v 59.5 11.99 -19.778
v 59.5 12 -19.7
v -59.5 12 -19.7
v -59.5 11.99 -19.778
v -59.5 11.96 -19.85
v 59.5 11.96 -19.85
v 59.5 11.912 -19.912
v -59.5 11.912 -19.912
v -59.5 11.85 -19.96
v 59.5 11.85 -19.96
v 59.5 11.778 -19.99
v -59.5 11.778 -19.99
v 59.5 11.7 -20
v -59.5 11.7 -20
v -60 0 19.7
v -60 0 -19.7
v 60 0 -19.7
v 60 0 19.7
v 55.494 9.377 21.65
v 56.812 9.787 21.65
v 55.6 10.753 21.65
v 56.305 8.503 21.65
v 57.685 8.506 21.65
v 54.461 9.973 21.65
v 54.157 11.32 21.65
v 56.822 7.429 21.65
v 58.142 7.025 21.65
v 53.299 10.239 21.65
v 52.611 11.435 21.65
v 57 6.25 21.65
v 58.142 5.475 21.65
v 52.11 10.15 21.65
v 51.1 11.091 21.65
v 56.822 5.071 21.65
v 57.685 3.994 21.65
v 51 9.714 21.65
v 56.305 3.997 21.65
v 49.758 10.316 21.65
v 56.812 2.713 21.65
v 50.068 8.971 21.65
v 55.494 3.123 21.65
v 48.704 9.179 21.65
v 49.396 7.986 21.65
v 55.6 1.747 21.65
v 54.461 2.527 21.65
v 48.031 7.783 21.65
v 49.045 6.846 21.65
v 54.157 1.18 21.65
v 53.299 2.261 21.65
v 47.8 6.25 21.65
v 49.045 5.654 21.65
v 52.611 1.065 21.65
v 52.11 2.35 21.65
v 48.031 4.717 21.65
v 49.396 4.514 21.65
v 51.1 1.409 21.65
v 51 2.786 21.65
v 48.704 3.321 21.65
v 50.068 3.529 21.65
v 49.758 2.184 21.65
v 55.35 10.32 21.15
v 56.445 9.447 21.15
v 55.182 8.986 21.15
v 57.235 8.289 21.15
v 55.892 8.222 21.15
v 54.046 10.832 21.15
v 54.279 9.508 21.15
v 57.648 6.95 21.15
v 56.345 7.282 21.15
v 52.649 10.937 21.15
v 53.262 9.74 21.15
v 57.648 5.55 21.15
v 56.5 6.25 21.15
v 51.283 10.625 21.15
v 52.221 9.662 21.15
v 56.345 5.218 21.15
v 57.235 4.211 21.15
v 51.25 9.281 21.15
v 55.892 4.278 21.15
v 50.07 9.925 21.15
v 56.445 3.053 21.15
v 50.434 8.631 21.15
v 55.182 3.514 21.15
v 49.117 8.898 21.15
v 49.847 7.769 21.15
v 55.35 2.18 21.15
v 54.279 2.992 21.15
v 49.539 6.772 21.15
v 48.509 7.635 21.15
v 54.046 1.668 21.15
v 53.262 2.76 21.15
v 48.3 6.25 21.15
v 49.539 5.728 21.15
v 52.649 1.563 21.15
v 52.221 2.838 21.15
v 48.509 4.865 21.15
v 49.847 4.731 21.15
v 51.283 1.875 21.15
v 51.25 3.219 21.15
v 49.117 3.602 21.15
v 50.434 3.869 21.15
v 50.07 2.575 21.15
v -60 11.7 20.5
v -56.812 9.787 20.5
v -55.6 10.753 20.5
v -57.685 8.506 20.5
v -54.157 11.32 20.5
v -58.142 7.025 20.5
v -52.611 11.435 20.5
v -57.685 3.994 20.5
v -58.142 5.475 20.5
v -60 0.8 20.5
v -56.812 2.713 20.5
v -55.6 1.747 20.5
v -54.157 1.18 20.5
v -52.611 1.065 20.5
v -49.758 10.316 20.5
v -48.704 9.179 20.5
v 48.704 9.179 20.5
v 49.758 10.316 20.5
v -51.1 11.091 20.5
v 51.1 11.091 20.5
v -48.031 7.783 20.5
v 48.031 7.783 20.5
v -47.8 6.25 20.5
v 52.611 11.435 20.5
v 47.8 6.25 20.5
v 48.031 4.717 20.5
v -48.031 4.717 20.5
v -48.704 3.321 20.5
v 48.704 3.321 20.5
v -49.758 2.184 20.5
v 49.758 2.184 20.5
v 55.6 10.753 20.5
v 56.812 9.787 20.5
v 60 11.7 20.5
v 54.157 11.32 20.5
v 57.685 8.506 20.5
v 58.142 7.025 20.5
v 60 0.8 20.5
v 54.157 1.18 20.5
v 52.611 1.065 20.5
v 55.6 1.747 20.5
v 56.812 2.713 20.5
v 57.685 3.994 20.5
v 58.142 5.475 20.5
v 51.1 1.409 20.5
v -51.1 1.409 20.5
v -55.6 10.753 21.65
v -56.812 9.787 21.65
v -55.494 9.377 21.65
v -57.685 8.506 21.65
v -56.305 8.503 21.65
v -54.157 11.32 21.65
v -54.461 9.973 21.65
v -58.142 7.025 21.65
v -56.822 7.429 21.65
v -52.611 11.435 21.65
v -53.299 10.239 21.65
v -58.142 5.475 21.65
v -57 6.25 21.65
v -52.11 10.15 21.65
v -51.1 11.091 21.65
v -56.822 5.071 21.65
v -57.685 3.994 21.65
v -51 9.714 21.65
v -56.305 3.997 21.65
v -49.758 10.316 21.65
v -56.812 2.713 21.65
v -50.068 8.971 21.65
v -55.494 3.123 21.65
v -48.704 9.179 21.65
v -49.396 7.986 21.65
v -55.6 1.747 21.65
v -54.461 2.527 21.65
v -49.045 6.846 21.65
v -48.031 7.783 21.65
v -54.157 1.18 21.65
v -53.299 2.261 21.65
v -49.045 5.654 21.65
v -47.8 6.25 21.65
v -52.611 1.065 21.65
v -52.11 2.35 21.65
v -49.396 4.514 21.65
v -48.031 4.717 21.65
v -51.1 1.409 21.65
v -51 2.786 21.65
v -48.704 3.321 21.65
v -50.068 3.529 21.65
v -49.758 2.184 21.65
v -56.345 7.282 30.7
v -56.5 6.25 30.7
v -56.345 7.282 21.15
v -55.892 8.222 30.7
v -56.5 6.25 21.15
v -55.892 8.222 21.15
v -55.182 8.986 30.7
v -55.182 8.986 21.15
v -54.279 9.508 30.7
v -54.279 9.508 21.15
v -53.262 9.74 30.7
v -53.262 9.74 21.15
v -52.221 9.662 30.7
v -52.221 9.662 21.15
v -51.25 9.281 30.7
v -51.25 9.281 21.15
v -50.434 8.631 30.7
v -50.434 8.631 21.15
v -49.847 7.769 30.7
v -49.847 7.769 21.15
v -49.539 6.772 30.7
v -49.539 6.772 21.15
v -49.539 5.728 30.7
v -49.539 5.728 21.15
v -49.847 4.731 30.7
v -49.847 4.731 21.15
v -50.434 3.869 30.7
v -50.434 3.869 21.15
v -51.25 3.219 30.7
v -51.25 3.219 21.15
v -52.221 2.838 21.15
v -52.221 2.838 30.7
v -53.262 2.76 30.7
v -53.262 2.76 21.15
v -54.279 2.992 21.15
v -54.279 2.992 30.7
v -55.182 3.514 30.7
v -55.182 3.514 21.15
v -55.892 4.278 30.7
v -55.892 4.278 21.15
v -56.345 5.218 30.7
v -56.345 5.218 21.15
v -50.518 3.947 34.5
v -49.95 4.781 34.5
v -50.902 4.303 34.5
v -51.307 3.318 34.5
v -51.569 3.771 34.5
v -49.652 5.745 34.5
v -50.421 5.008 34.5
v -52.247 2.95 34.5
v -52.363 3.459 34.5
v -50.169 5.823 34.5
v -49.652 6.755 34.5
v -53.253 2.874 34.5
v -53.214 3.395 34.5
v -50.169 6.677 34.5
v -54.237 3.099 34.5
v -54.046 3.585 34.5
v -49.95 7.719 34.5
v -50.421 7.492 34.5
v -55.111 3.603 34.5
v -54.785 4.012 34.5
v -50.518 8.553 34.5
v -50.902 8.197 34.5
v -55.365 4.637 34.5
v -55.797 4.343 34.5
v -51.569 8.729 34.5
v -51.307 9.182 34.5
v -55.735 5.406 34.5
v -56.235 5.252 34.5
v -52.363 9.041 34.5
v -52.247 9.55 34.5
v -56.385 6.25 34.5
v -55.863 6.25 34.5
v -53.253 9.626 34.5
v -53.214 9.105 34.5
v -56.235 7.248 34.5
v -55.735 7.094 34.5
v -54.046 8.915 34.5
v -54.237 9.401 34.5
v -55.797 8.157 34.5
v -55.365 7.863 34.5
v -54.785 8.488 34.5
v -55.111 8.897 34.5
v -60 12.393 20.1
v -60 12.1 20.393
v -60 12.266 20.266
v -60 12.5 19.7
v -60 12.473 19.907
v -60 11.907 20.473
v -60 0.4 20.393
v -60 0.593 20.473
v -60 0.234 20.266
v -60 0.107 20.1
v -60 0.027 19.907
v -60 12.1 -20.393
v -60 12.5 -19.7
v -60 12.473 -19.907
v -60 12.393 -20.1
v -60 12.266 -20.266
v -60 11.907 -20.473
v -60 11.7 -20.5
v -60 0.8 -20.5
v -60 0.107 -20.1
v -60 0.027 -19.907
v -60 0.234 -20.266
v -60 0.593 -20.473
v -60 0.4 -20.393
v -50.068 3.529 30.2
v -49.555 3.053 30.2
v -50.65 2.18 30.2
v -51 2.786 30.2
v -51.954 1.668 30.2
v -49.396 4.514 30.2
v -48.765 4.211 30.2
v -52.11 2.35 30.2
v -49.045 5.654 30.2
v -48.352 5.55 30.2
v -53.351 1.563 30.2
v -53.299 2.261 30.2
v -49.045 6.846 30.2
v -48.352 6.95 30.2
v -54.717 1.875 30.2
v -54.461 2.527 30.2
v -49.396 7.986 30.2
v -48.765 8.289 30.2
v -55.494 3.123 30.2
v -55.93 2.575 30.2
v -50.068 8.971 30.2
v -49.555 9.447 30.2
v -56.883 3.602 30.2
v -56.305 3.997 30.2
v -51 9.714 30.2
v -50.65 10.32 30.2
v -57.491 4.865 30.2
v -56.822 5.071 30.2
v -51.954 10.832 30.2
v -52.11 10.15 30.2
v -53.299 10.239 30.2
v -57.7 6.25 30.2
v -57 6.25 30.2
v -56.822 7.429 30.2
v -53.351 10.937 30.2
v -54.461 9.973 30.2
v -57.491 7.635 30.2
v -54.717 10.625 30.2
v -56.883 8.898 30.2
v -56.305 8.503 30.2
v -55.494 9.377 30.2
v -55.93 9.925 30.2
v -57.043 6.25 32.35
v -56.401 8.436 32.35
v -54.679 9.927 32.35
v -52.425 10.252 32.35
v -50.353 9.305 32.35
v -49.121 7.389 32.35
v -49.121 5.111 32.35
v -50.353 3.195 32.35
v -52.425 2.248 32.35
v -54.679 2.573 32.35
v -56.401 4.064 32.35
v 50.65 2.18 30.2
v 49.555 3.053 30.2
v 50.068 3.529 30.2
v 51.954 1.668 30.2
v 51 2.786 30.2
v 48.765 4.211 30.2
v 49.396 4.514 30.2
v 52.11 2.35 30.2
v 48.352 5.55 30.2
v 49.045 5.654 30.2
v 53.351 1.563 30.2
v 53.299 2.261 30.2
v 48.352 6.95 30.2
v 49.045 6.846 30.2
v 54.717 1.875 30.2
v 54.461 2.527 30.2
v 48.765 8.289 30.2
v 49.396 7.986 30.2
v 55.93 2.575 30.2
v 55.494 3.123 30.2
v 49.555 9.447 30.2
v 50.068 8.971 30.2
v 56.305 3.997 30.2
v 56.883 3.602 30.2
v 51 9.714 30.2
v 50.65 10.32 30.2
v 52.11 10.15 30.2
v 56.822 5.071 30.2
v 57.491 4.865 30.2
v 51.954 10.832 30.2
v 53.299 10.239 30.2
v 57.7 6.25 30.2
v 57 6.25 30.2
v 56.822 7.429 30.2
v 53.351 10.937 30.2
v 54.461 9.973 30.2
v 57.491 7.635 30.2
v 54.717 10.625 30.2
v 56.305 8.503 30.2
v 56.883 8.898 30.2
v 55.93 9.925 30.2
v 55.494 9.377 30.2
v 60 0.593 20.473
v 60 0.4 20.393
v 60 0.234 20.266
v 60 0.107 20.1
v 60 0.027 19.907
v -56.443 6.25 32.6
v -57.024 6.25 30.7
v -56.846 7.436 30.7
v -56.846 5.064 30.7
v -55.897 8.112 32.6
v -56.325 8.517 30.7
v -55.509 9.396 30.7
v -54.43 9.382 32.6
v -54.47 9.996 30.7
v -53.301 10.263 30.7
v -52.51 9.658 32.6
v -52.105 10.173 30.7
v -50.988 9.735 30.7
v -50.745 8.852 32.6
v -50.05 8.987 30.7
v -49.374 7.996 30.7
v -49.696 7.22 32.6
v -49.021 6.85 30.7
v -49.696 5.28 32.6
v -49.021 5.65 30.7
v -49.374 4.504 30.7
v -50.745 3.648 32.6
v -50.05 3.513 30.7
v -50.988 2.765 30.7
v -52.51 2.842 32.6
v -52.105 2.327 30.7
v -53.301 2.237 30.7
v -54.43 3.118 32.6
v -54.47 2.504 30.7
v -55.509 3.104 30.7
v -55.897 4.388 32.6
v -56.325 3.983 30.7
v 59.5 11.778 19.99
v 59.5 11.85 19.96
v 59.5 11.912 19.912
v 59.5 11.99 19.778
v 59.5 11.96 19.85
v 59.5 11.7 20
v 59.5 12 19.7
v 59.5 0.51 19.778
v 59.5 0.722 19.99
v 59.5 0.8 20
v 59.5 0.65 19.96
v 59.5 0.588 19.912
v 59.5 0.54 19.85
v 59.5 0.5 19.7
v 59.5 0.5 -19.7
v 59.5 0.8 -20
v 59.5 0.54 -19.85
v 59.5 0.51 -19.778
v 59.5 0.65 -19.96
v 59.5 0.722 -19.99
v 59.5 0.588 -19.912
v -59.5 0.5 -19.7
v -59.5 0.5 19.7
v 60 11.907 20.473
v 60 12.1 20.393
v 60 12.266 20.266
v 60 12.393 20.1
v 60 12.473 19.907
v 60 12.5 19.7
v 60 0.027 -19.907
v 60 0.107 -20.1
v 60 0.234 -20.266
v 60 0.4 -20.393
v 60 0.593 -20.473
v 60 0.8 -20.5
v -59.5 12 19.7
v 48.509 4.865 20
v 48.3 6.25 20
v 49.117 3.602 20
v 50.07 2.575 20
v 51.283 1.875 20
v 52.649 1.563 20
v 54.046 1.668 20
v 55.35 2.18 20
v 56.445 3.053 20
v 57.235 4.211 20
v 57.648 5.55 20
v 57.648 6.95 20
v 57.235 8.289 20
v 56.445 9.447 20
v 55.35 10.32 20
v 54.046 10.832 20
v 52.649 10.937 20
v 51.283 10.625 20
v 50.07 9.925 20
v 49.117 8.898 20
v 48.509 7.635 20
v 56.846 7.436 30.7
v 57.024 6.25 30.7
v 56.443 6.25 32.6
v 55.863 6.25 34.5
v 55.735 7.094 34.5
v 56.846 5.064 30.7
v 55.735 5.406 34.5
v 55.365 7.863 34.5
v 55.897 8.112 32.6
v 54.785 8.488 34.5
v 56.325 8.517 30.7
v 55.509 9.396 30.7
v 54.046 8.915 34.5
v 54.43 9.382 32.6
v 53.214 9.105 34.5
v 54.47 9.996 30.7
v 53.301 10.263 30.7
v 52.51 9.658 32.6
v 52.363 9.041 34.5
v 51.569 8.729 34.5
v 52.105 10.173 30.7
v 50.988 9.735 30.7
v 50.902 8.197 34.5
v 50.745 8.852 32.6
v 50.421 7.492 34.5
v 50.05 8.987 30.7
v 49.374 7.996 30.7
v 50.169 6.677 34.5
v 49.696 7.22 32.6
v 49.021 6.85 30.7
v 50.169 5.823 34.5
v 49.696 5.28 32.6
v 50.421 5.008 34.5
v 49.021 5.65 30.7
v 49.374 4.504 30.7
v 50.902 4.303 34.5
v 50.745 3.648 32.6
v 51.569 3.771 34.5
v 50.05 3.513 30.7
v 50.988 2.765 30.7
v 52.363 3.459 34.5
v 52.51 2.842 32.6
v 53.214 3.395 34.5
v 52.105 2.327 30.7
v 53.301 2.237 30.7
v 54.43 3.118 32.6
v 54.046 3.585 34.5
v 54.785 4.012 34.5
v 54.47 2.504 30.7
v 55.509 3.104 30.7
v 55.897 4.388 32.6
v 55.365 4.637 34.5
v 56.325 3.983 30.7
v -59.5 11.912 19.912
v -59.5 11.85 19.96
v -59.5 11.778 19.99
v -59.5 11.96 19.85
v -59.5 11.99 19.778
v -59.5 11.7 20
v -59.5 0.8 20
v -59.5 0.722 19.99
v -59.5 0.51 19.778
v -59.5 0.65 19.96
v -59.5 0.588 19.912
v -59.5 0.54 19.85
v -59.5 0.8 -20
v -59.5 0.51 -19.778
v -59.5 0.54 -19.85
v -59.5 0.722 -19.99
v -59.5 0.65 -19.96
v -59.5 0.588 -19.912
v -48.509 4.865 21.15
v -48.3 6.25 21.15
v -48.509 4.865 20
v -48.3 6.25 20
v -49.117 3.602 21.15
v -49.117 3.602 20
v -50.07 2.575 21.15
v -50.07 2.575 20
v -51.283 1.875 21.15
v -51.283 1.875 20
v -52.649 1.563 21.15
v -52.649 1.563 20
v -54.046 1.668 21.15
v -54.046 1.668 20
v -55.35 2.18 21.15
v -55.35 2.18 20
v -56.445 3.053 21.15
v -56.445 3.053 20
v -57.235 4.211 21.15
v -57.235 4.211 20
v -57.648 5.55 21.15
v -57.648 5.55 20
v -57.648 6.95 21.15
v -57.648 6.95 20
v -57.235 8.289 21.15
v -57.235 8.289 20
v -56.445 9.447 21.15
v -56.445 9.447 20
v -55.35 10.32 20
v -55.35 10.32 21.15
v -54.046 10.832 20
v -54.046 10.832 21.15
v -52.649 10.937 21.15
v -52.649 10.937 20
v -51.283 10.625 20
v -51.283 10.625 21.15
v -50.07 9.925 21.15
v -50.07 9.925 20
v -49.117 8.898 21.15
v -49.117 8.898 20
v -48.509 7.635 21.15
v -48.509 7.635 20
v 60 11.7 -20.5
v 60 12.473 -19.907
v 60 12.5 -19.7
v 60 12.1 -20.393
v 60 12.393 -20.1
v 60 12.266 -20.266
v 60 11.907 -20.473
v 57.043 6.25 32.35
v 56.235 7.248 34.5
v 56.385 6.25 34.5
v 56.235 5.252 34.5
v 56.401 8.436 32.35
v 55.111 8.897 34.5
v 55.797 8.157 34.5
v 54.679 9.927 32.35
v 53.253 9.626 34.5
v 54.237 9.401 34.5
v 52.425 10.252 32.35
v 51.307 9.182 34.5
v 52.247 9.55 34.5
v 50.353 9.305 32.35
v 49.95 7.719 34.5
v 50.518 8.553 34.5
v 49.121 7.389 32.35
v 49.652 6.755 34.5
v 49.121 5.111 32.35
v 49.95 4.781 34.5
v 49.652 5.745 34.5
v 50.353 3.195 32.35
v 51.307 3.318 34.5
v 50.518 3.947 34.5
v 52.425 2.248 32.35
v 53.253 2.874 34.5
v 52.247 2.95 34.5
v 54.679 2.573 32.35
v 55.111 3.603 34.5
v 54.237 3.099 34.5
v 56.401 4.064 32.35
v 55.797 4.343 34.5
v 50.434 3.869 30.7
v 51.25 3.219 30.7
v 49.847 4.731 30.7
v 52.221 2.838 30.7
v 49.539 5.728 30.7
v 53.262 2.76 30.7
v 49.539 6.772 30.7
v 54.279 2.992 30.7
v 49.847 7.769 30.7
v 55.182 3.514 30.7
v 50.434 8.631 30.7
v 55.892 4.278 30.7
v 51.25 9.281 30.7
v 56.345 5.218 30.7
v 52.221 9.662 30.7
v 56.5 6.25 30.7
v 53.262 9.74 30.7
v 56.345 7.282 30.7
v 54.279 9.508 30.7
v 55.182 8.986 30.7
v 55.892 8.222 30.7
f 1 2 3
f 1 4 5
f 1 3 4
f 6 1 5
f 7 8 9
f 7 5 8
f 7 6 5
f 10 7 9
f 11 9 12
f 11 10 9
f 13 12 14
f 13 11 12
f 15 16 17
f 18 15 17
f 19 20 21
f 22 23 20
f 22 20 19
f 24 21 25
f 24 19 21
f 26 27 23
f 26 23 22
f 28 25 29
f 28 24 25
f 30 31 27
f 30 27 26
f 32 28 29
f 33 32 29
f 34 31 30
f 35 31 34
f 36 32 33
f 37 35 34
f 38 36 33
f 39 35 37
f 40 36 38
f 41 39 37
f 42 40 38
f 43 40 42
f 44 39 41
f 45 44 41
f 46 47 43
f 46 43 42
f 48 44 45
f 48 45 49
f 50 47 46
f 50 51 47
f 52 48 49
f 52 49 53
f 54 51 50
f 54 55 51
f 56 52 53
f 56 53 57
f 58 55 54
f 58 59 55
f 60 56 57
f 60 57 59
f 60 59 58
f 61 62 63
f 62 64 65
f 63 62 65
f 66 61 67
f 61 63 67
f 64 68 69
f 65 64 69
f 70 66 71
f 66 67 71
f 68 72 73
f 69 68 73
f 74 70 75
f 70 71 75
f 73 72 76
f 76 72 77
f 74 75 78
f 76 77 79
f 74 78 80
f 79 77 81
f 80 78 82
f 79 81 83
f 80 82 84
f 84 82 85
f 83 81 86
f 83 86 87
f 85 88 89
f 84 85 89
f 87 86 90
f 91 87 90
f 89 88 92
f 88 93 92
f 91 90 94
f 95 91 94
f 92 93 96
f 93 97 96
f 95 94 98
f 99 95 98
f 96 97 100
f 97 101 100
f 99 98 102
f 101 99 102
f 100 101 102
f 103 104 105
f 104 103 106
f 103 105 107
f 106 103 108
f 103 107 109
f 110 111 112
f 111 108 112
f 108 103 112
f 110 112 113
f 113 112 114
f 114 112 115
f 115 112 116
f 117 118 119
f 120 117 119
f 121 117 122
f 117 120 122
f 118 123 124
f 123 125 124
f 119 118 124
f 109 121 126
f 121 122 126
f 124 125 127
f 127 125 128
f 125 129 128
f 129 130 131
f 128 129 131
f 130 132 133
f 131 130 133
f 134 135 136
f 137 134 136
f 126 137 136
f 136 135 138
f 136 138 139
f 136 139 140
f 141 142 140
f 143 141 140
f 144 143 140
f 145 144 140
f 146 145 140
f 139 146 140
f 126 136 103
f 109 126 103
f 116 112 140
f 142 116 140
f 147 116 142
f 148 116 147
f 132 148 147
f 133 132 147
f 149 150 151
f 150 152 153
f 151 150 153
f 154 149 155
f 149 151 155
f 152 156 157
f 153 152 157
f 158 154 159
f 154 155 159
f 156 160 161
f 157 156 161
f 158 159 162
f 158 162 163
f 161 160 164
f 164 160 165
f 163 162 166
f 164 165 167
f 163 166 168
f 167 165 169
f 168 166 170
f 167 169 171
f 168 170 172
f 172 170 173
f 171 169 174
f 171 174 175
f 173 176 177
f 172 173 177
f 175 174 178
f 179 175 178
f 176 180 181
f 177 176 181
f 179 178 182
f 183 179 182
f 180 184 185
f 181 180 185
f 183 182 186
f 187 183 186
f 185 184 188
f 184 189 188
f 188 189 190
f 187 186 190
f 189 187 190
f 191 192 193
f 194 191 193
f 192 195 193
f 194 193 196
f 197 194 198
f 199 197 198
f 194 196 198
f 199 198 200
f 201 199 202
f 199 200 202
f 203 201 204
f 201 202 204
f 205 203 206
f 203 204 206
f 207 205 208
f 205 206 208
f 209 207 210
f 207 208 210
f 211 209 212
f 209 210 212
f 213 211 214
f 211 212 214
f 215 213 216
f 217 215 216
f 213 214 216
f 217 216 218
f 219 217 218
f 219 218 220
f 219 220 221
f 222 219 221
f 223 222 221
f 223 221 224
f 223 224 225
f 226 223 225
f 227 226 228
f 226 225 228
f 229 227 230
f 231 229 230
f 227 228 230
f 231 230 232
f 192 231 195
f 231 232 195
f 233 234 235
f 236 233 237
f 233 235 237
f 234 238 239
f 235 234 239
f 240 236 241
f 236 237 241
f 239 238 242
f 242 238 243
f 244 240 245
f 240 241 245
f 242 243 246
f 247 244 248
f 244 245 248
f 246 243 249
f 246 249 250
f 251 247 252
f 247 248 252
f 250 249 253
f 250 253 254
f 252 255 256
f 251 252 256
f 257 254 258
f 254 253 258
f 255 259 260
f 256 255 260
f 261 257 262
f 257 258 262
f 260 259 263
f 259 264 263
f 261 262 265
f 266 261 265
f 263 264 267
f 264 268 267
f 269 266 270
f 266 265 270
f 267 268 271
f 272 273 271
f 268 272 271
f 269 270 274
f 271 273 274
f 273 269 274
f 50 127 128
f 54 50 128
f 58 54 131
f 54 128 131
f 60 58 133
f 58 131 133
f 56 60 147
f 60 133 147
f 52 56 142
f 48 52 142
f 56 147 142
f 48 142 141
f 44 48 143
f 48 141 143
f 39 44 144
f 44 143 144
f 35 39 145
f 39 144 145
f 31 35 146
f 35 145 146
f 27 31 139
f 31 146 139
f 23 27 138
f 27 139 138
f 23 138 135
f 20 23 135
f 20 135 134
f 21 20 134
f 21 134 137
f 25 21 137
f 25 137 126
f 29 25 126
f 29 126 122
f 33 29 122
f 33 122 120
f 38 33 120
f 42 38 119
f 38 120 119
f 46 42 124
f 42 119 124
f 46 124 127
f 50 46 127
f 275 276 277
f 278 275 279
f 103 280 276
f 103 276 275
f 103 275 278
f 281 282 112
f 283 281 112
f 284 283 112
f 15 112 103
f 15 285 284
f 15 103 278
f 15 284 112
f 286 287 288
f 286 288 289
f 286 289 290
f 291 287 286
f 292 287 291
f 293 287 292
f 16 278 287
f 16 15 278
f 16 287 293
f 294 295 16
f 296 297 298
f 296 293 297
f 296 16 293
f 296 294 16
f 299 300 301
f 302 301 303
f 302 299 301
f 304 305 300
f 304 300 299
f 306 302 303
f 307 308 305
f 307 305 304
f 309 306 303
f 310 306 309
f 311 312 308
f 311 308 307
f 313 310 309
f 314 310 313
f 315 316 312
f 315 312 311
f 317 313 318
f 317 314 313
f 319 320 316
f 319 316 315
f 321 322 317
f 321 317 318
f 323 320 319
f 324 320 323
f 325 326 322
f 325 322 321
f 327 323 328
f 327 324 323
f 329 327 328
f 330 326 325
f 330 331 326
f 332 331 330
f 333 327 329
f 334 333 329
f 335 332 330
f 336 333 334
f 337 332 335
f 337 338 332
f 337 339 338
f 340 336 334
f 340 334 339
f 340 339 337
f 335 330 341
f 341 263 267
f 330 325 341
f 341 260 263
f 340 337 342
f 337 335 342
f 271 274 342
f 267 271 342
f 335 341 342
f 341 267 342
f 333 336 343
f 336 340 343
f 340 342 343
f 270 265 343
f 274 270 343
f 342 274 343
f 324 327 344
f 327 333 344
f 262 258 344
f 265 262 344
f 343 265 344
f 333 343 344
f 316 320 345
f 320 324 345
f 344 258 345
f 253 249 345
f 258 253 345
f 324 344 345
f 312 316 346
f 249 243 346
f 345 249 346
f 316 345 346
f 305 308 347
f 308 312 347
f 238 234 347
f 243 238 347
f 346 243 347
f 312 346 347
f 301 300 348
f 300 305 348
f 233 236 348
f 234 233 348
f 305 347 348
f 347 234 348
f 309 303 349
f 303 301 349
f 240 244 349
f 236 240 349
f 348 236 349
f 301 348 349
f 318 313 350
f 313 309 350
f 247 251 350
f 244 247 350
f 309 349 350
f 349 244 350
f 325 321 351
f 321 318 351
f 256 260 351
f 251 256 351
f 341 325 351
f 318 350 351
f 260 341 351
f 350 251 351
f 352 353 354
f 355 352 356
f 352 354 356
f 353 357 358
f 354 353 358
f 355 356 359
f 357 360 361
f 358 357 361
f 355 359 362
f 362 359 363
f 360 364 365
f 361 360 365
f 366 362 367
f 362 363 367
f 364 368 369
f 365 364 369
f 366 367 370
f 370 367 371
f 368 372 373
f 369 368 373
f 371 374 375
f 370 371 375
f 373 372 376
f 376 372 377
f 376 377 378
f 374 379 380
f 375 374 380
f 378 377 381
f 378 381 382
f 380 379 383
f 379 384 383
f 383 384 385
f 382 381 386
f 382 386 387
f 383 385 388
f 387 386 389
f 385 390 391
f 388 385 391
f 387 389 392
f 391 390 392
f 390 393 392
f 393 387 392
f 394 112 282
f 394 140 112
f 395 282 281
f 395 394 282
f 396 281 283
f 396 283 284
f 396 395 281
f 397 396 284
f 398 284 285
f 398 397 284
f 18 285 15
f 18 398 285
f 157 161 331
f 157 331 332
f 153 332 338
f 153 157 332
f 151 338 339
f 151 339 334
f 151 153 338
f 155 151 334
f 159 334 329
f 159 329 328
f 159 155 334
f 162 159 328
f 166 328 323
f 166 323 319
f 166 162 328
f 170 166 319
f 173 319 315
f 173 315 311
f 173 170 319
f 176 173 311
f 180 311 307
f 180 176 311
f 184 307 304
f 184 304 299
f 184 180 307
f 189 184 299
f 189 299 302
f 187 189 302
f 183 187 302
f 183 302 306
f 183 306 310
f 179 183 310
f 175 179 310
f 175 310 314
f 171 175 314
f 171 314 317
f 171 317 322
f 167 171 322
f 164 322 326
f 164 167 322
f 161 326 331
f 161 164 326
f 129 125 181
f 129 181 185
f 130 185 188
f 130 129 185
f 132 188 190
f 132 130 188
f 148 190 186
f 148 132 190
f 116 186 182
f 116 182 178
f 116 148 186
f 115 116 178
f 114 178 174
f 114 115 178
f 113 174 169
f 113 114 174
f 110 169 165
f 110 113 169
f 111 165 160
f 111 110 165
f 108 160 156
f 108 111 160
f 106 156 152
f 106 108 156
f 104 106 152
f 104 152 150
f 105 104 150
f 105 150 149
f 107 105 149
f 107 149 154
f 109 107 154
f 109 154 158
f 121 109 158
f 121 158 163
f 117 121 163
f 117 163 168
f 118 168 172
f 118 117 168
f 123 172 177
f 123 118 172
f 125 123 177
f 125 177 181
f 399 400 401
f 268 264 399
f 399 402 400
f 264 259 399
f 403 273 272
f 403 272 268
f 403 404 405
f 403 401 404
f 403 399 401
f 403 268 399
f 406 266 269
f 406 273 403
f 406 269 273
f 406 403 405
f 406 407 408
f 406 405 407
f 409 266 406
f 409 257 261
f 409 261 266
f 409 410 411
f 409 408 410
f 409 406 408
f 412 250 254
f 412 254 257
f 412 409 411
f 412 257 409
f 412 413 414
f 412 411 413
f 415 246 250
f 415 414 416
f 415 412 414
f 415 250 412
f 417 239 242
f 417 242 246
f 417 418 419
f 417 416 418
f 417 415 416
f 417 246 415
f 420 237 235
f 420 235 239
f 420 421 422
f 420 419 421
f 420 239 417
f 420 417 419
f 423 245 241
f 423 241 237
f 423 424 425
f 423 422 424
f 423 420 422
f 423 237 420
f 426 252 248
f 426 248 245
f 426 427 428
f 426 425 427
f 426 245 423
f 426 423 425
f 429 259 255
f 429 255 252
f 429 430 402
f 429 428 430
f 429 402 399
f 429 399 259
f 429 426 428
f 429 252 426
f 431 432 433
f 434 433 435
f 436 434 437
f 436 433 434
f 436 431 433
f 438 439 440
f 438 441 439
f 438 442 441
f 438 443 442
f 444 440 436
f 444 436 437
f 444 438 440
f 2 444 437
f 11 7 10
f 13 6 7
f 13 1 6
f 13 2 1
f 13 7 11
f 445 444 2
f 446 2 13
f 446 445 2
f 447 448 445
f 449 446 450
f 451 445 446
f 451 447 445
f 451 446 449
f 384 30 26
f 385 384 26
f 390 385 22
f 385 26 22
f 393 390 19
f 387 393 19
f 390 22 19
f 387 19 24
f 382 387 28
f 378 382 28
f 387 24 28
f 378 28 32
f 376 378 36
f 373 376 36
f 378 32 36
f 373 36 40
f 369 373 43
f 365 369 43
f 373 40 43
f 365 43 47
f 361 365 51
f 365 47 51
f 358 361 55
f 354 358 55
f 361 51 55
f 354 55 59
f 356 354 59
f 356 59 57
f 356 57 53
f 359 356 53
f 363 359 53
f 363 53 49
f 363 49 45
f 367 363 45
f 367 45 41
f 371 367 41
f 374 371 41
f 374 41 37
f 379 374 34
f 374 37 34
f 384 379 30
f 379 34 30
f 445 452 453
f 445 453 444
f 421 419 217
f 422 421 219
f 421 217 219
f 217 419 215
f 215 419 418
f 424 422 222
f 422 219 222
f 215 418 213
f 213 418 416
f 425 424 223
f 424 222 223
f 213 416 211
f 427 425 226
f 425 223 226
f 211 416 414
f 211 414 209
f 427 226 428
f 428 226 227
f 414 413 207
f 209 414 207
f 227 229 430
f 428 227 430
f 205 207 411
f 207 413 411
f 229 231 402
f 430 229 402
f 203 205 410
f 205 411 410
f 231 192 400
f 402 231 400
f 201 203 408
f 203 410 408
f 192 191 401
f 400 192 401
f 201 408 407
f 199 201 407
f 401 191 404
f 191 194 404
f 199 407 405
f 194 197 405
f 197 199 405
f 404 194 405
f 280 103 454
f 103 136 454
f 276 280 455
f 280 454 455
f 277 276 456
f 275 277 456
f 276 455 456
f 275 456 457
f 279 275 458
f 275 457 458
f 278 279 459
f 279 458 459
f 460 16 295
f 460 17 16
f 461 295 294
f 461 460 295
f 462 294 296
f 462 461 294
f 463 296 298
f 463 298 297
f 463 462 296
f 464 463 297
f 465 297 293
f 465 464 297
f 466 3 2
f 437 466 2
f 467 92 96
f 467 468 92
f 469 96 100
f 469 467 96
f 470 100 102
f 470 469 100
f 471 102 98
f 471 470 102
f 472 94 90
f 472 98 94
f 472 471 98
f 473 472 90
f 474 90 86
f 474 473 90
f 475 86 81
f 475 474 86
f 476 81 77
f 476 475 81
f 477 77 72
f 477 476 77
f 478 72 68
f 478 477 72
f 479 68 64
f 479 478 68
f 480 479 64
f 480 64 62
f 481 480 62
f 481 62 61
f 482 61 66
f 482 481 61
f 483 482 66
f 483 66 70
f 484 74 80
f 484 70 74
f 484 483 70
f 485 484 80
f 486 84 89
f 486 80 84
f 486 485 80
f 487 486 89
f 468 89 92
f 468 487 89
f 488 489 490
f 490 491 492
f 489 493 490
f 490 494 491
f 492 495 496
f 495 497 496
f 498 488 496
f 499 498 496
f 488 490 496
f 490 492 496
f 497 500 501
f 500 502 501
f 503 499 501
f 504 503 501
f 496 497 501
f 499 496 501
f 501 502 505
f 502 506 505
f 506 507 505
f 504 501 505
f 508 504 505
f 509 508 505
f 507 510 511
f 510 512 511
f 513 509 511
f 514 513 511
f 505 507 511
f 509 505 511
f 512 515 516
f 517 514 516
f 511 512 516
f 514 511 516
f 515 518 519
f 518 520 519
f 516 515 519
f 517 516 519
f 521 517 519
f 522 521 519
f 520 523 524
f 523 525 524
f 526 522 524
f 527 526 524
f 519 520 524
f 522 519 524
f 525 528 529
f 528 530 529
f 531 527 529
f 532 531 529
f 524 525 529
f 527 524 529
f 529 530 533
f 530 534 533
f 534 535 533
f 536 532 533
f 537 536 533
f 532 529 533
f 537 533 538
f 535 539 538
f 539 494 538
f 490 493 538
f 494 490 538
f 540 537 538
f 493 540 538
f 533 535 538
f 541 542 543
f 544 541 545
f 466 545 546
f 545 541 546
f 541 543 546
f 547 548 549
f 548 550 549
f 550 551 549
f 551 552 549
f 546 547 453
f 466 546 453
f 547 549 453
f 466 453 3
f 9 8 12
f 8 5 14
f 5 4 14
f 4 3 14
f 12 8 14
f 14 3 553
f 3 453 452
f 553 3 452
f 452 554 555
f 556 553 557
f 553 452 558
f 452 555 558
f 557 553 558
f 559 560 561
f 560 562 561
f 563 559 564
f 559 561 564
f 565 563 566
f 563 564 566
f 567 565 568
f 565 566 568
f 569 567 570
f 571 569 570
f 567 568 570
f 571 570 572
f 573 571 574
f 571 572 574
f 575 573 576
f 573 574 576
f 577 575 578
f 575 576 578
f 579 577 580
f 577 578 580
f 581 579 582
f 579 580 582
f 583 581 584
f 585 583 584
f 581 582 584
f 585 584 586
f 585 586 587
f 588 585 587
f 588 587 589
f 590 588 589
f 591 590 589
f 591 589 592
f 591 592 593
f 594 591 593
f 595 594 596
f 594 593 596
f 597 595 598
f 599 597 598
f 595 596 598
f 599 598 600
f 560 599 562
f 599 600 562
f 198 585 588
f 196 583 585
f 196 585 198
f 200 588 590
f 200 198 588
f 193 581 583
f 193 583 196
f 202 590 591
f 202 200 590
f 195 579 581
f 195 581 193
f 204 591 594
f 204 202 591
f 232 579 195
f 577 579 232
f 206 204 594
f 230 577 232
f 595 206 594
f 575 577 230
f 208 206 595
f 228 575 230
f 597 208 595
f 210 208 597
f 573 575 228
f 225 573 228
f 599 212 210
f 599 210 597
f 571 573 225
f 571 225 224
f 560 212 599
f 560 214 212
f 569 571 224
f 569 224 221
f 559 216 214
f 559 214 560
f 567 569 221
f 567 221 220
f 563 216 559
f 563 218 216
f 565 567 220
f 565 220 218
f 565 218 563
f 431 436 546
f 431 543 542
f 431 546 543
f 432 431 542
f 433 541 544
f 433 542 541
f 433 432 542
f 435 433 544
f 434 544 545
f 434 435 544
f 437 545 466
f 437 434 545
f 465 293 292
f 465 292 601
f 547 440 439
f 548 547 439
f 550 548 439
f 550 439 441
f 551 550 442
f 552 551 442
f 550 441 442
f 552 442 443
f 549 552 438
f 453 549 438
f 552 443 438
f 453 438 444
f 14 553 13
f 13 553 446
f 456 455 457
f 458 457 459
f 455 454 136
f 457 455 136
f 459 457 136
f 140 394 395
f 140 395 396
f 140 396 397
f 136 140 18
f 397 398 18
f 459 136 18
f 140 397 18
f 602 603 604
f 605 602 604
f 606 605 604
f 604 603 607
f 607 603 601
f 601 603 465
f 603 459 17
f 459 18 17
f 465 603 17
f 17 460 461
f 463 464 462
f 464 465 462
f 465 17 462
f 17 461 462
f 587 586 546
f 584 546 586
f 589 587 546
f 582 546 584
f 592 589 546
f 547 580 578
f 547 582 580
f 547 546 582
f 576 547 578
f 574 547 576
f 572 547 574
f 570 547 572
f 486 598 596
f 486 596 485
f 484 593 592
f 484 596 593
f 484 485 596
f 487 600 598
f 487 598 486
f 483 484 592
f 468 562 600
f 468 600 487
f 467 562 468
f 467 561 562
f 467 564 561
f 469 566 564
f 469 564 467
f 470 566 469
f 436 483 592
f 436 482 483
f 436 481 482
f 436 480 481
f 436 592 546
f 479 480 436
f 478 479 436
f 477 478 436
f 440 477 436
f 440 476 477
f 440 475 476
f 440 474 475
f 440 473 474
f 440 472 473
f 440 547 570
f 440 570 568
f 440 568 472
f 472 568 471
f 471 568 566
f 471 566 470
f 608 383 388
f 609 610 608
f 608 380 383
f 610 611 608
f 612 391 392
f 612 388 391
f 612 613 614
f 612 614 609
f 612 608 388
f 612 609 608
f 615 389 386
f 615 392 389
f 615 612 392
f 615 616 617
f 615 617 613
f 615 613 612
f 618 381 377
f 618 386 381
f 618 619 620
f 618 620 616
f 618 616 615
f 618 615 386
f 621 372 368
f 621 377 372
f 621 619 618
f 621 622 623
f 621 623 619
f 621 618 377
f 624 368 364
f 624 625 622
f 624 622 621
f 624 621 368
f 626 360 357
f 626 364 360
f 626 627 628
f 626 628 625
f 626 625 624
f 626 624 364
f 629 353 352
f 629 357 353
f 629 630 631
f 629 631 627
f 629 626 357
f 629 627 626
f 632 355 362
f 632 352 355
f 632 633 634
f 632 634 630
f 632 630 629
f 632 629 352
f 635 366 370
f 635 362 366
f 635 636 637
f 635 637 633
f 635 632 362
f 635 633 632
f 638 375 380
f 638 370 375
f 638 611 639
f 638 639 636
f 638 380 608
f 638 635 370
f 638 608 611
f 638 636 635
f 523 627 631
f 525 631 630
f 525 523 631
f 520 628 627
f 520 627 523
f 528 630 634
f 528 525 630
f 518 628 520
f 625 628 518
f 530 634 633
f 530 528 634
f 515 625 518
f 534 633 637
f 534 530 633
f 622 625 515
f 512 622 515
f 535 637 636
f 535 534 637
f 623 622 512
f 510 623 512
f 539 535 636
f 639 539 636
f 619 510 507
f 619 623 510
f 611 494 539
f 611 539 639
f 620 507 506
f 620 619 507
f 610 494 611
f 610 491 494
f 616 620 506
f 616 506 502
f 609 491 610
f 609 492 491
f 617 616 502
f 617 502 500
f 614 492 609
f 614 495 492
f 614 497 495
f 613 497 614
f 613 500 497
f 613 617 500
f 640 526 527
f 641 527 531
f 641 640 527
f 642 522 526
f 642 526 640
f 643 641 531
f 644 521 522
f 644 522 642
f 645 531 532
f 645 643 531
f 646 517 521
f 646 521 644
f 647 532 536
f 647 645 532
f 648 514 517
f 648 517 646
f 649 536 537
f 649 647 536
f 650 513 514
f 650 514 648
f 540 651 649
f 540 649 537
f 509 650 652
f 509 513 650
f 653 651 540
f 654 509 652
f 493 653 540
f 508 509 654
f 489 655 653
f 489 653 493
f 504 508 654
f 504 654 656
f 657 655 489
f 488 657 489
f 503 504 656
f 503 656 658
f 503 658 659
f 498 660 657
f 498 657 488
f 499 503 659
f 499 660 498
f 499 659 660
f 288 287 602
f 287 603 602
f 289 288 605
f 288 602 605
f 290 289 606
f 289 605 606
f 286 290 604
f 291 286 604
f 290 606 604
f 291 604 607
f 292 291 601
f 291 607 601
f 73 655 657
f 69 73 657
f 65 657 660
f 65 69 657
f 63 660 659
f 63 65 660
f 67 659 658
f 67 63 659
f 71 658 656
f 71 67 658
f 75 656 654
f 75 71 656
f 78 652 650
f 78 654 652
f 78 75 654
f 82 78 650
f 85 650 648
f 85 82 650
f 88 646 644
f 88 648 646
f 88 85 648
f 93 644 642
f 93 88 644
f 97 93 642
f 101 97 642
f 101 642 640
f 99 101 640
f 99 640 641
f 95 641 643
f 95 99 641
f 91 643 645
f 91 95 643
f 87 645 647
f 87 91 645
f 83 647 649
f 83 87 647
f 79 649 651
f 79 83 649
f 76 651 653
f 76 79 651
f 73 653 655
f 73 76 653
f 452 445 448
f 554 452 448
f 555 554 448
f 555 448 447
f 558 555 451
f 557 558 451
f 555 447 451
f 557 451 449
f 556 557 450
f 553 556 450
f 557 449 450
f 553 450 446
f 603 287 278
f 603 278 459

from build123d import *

# Parameters (mm, degrees)
SKETCH1_W           = 120
SKETCH1_H           = 41
BOSS_EXTRUDE1_DEPTH = 12.5
SKETCH2_R           = 5.2
BOSS_EXTRUDE2_DEPTH = 1.15
SKETCH3_R           = 4
BOSS_EXTRUDE3_DEPTH = 8.55
SKETCH4_R           = 4.7
BOSS_EXTRUDE4_DEPTH = 4.3
BOSS_EXTRUDE4_TAPER = 17
FILLET1_R           = 0.8
SHELL1_T            = -0.5


with BuildPart() as part:
    # Sketch1 → Boss-Extrude1 (new body)
    with BuildSketch(Plane(origin=(0, 0, 0), x_dir=(1, 0, 0), z_dir=(0, 1, 0))):
        Rectangle(SKETCH1_W, SKETCH1_H)
    extrude(amount=BOSS_EXTRUDE1_DEPTH)

    # Sketch2 → Boss-Extrude2 (add)
    with BuildSketch(Plane.XY.offset(20.5)):
        with Locations((53, 6.25)):
            Circle(SKETCH2_R)
    boss_extrude2 = extrude(amount=BOSS_EXTRUDE2_DEPTH)

    # Sketch3 → Boss-Extrude3 (add)
    with BuildSketch(Plane.XY.offset(21.65)):
        with Locations((53, 6.25)):
            Circle(SKETCH3_R)
    boss_extrude3 = extrude(amount=BOSS_EXTRUDE3_DEPTH)

    # Sketch4 → Boss-Extrude4 (add)
    with BuildSketch(Plane.XY.offset(30.2)):
        with Locations((53, 6.25)):
            Circle(SKETCH4_R)
    boss_extrude4 = extrude(amount=BOSS_EXTRUDE4_DEPTH, taper=BOSS_EXTRUDE4_TAPER)

    # Mirror1: Boss-Extrude2, Boss-Extrude3, Boss-Extrude4 across plane
    add(boss_extrude2.mirror(Plane(origin=(0, 0, 0), x_dir=(0, 0, 1), z_dir=(1, 0, 0))))
    add(boss_extrude3.mirror(Plane(origin=(0, 0, 0), x_dir=(0, 0, 1), z_dir=(1, 0, 0))))
    add(boss_extrude4.mirror(Plane(origin=(0, 0, 0), x_dir=(0, 0, 1), z_dir=(1, 0, 0))))

    # Fillet1
    fillet1_edges = [part.edges().sort_by_distance(p)[0] for p in [
        (0, 12.5, -20.5),
        (0, 12.5, 20.5),
        (0, 0, 20.5),
        (0, 0, -20.5),
    ]]
    fillet(fillet1_edges, radius=FILLET1_R)

    # Shell1
    shell1_openings = [part.faces().sort_by_distance(p)[0] for p in [
        (53, 6.25, 34.5),
        (-53, 6.25, 34.5),
    ]]
    offset(amount=SHELL1_T, openings=shell1_openings, kind=Kind.INTERSECTION)


solid = part.part
